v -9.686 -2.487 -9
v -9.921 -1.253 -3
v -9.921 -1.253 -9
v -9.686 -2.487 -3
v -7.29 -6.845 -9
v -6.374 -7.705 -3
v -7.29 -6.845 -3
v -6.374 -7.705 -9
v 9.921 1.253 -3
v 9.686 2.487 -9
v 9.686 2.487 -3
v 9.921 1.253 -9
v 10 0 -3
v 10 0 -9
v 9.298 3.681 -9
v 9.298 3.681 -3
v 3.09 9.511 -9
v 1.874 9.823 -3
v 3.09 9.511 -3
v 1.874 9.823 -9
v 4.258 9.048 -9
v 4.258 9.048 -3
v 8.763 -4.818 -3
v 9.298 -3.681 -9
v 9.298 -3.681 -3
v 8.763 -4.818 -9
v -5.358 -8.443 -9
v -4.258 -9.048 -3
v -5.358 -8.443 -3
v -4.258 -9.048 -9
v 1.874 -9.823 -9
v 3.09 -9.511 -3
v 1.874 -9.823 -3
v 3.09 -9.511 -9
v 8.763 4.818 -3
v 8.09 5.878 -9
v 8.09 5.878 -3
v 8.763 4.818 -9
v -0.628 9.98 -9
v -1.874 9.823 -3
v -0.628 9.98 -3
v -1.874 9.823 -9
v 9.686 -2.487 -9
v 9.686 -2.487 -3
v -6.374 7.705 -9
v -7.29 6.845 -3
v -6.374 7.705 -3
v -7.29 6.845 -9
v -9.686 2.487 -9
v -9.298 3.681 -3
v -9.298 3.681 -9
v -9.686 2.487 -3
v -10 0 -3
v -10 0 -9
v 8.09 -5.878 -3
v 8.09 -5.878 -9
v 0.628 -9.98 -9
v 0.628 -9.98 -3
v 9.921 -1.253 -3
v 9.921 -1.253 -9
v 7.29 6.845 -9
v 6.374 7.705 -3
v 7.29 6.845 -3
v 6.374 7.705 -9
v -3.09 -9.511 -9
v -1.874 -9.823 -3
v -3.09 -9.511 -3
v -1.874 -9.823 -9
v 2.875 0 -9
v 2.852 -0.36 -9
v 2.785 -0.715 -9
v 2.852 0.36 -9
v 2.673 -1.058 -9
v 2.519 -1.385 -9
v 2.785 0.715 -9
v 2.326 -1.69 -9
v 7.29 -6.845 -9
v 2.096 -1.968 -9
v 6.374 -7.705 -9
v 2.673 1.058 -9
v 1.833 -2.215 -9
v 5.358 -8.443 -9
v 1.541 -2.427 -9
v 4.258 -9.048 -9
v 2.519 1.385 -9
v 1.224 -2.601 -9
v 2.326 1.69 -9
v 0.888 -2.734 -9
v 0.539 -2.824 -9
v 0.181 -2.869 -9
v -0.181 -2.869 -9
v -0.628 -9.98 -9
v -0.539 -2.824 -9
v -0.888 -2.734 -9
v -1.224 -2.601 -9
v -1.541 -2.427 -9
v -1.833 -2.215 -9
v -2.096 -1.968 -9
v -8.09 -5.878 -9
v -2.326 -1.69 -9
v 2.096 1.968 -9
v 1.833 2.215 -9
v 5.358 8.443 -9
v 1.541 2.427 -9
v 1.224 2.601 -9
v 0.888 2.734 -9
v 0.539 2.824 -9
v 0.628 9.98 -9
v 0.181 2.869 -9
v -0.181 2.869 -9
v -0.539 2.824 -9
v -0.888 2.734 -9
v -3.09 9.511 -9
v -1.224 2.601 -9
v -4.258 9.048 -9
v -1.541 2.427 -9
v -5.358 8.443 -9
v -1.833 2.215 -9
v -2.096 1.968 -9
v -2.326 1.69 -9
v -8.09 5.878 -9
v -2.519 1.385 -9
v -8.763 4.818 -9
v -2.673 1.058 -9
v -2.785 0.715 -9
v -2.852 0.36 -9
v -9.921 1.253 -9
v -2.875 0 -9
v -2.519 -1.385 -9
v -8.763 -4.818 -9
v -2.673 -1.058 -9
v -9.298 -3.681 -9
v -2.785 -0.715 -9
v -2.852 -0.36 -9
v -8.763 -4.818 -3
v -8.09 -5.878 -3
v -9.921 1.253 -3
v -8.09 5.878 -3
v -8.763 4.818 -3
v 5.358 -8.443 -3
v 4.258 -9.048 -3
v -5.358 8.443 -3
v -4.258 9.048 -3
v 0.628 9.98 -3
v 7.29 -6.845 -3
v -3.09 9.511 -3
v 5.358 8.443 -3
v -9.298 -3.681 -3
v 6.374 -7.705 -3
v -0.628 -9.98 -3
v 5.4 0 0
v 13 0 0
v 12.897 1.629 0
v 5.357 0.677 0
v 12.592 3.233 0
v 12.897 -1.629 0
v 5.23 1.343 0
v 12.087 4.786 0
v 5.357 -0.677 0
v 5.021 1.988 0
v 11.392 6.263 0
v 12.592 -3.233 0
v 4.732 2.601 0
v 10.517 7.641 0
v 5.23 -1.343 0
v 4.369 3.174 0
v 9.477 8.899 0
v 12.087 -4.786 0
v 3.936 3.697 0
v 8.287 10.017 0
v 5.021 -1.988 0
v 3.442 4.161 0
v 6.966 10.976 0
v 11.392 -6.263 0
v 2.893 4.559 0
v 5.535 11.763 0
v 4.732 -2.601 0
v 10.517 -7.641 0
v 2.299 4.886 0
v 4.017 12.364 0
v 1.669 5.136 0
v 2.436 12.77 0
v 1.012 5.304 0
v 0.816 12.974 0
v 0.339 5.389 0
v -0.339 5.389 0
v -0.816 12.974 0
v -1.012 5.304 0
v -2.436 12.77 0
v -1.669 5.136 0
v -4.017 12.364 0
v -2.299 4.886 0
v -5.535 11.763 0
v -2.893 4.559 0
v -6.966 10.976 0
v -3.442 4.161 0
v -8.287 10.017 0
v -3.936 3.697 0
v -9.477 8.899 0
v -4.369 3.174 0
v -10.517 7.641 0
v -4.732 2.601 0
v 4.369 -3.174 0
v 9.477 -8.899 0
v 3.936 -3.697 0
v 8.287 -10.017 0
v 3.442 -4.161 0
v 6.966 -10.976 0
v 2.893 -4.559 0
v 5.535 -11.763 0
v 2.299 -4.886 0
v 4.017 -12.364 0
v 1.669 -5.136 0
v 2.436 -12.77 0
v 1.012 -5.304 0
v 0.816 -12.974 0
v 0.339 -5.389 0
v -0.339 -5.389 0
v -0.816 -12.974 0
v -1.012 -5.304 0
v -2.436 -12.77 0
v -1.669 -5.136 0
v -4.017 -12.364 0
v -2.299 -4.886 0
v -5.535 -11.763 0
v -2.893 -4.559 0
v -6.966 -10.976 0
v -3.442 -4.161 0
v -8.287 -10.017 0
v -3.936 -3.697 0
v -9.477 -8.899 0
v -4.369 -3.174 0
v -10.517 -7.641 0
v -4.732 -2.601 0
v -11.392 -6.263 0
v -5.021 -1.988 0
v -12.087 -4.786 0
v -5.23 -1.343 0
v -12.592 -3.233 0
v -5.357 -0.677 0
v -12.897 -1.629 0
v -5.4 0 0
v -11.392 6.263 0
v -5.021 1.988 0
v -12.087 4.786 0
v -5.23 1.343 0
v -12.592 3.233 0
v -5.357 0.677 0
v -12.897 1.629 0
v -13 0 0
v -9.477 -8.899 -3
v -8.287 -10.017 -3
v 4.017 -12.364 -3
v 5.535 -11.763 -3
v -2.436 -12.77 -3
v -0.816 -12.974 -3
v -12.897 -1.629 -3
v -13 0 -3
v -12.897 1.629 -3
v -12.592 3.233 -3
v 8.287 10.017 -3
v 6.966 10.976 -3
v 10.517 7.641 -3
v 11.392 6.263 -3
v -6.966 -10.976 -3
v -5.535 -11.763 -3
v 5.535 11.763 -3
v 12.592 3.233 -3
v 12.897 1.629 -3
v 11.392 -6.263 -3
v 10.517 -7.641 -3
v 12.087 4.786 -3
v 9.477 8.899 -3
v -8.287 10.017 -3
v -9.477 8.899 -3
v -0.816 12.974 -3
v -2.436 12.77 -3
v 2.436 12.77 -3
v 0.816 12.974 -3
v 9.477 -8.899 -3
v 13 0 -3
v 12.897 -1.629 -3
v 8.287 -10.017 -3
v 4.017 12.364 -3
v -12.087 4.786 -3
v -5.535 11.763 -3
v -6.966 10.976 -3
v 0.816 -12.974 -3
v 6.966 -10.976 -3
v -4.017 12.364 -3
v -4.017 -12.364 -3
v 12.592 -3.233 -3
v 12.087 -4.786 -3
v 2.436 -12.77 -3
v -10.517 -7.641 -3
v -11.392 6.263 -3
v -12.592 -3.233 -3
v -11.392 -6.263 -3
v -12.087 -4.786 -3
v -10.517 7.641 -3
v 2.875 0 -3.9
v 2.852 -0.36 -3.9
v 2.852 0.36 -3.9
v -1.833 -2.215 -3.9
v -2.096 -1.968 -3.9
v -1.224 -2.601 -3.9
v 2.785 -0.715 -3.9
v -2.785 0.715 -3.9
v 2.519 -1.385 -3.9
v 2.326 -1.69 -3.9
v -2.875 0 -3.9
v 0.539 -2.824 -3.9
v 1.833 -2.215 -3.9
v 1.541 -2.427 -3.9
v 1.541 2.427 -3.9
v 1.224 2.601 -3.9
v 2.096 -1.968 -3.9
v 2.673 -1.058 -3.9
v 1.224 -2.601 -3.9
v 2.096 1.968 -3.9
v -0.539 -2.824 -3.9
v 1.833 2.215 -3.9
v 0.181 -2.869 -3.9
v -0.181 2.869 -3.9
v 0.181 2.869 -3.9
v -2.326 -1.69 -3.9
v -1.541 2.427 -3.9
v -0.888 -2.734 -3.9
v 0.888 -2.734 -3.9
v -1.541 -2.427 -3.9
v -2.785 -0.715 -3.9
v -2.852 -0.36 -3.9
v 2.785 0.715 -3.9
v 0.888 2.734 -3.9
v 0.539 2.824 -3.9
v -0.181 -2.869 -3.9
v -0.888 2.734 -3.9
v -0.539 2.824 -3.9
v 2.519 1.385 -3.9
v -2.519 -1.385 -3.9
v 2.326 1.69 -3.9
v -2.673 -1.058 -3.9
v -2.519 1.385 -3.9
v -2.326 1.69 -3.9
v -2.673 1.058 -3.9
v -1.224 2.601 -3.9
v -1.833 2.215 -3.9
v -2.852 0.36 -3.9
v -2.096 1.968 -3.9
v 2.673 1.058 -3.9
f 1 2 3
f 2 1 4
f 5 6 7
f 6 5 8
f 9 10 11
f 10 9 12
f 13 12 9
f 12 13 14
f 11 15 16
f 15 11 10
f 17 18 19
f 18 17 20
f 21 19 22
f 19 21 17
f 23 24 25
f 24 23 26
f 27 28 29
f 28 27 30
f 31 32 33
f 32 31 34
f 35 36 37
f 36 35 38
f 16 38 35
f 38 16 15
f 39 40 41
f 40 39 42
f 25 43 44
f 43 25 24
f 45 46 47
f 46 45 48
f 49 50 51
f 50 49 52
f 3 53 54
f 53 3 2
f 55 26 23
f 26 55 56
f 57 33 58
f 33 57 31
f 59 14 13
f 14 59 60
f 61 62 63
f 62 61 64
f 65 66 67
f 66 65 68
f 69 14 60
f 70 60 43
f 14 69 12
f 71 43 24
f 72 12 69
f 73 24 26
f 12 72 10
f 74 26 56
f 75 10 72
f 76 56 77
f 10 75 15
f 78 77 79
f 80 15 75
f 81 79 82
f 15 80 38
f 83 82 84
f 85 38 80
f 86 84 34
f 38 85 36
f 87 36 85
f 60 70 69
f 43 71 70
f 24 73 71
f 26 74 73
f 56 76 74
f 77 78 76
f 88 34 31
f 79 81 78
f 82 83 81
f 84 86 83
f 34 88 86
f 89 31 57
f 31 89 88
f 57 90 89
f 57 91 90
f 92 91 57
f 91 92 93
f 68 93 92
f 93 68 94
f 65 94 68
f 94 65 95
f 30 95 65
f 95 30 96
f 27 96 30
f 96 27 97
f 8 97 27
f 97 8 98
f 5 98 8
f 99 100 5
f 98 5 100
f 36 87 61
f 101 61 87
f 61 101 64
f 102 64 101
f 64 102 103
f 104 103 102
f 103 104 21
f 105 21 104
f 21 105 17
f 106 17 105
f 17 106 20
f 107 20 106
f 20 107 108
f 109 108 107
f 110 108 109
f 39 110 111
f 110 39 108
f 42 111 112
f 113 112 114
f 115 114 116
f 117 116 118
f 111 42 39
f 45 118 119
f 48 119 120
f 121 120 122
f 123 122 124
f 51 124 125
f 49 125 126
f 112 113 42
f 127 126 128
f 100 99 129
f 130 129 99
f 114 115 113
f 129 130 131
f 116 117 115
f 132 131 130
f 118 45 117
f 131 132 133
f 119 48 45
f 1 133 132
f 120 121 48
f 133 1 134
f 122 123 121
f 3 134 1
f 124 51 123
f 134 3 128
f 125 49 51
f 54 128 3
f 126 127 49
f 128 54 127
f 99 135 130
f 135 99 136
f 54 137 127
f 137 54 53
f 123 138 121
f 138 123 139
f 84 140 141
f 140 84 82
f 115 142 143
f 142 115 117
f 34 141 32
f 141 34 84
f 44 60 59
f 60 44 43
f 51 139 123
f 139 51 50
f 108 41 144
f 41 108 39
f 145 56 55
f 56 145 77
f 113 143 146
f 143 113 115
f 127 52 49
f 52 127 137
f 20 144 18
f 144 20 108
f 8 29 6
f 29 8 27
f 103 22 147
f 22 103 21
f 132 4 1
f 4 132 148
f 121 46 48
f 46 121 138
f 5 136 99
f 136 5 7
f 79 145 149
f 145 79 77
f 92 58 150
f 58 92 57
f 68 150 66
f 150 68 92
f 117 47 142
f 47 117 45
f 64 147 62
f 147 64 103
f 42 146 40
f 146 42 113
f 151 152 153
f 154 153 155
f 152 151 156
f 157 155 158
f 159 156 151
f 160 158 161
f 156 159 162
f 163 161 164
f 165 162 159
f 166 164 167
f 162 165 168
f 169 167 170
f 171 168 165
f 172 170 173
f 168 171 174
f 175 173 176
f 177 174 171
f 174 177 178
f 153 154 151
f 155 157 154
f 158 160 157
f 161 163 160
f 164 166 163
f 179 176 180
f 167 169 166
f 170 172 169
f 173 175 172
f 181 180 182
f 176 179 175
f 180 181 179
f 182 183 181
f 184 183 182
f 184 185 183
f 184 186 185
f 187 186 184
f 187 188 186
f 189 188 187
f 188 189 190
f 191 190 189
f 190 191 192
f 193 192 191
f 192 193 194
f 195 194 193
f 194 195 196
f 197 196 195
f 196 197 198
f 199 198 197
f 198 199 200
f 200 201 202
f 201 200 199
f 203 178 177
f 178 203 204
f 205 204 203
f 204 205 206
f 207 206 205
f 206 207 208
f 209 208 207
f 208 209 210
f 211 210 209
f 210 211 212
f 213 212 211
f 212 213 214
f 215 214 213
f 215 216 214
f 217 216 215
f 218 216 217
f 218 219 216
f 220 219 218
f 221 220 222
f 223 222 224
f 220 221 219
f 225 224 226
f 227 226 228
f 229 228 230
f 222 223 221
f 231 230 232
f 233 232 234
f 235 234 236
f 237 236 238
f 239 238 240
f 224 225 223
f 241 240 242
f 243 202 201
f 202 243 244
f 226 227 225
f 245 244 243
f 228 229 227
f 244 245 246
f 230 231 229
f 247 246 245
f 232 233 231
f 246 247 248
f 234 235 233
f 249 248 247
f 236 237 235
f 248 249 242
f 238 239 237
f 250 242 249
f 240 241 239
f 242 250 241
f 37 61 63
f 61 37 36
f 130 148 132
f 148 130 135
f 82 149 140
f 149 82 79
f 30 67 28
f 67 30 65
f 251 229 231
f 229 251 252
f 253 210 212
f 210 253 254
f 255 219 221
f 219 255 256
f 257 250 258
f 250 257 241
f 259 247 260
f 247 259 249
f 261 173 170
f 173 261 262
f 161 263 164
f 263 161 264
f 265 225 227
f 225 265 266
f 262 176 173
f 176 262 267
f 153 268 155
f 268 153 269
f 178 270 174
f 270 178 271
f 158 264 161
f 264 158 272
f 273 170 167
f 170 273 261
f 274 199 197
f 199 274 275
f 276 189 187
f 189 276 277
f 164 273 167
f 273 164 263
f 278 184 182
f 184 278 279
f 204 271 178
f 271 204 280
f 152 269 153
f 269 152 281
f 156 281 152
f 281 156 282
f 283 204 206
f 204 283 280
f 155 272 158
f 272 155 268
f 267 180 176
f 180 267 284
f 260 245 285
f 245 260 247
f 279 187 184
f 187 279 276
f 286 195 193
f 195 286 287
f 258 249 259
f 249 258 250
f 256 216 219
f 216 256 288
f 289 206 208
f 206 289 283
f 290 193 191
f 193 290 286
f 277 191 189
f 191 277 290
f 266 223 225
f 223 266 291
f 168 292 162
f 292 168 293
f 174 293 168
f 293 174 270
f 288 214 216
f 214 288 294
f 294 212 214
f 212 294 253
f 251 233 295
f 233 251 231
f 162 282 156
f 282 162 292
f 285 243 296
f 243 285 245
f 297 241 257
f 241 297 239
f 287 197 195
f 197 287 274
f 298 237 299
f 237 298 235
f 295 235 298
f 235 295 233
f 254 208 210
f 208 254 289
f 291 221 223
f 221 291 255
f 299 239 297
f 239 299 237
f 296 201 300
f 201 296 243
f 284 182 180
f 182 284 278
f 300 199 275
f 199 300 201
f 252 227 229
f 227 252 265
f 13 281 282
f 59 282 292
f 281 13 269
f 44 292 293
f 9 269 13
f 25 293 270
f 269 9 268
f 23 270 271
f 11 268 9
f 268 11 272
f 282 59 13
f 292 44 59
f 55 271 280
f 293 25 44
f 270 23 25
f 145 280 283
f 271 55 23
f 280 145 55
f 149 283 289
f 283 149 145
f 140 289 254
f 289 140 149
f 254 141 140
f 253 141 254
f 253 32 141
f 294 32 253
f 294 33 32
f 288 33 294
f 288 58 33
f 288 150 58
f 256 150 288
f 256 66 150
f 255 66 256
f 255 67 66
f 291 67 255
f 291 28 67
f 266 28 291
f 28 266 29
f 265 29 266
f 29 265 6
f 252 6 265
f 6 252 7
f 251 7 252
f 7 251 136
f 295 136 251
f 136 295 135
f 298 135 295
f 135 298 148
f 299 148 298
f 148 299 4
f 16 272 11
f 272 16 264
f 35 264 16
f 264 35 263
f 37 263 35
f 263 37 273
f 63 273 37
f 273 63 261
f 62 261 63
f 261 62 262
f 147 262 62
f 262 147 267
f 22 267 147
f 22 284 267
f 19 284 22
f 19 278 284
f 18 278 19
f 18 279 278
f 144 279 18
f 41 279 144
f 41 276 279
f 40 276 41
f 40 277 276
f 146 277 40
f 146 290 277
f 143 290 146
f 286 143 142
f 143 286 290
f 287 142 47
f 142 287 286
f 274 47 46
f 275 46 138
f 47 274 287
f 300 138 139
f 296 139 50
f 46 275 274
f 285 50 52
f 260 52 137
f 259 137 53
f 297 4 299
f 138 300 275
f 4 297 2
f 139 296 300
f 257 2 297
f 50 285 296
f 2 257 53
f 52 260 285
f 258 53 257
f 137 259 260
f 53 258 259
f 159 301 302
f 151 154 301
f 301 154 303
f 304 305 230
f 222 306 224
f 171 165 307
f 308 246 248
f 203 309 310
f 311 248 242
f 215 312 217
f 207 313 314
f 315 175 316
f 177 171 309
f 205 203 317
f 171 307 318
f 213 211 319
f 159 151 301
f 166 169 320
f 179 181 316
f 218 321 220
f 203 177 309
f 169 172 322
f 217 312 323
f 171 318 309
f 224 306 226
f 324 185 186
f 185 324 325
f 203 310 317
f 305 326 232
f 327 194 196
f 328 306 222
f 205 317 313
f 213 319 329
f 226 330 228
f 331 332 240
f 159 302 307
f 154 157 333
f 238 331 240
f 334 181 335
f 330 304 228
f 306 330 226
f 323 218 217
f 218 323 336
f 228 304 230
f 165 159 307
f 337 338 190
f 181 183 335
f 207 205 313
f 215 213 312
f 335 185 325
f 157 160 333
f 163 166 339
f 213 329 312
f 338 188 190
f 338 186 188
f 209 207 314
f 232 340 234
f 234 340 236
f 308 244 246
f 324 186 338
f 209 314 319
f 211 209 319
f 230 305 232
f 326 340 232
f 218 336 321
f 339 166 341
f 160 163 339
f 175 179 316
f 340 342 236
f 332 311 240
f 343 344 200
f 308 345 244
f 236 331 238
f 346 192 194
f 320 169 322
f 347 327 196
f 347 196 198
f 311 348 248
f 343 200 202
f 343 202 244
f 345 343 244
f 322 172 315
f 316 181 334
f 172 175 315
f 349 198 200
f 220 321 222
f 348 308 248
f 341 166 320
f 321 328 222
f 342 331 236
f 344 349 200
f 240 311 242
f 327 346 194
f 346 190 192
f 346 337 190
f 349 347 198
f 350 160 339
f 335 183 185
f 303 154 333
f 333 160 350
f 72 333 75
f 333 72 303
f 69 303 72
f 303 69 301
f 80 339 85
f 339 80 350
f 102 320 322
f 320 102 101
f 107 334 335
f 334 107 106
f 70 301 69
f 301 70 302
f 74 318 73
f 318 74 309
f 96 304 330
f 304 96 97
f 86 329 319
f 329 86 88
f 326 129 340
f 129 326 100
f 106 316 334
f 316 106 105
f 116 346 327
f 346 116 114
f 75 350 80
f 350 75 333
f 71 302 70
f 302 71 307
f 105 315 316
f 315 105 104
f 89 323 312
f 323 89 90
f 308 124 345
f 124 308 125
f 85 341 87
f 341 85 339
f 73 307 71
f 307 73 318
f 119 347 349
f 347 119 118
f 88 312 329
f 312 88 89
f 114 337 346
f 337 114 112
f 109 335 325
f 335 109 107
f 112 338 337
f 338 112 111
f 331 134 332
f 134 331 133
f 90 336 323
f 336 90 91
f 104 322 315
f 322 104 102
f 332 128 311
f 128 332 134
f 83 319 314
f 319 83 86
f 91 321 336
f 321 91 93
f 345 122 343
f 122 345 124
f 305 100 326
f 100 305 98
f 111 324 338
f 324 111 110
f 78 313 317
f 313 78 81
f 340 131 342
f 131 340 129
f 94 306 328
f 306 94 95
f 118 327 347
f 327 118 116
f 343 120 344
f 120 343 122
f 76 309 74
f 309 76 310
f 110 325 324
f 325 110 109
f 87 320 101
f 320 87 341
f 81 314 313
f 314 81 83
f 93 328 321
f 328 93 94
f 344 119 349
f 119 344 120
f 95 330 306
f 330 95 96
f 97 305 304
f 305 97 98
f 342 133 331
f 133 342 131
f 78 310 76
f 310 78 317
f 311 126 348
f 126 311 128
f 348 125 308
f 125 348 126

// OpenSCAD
$fn = 50;


difference() {
	union() {
		translate(v = [0, 0, -9.0000000000]) {
			cylinder(h = 9, r = 10.0000000000);
		}
		translate(v = [0, 0, -3.0000000000]) {
			cylinder(h = 3, r = 13.0000000000);
		}
	}
	union() {
		translate(v = [0, 0, 0]) {
			rotate(a = [0, 0, 0]) {
				difference() {
					union() {
						#translate(v = [0, 0, -9.0000000000]) {
							cylinder(h = 9, r = 2.6000000000);
						}
						#translate(v = [0, 0, -3.9000000000]) {
							cylinder(h = 3.9000000000, r1 = 2.8750000000, r2 = 5.4000000000);
						}
						#translate(v = [0, 0, -9.0000000000]) {
							cylinder(h = 9, r = 2.8750000000);
						}
						#translate(v = [0, 0, -9.0000000000]) {
							cylinder(h = 9, r = 2.6000000000);
						}
					}
					union();
				}
			}
		}
	}
}
